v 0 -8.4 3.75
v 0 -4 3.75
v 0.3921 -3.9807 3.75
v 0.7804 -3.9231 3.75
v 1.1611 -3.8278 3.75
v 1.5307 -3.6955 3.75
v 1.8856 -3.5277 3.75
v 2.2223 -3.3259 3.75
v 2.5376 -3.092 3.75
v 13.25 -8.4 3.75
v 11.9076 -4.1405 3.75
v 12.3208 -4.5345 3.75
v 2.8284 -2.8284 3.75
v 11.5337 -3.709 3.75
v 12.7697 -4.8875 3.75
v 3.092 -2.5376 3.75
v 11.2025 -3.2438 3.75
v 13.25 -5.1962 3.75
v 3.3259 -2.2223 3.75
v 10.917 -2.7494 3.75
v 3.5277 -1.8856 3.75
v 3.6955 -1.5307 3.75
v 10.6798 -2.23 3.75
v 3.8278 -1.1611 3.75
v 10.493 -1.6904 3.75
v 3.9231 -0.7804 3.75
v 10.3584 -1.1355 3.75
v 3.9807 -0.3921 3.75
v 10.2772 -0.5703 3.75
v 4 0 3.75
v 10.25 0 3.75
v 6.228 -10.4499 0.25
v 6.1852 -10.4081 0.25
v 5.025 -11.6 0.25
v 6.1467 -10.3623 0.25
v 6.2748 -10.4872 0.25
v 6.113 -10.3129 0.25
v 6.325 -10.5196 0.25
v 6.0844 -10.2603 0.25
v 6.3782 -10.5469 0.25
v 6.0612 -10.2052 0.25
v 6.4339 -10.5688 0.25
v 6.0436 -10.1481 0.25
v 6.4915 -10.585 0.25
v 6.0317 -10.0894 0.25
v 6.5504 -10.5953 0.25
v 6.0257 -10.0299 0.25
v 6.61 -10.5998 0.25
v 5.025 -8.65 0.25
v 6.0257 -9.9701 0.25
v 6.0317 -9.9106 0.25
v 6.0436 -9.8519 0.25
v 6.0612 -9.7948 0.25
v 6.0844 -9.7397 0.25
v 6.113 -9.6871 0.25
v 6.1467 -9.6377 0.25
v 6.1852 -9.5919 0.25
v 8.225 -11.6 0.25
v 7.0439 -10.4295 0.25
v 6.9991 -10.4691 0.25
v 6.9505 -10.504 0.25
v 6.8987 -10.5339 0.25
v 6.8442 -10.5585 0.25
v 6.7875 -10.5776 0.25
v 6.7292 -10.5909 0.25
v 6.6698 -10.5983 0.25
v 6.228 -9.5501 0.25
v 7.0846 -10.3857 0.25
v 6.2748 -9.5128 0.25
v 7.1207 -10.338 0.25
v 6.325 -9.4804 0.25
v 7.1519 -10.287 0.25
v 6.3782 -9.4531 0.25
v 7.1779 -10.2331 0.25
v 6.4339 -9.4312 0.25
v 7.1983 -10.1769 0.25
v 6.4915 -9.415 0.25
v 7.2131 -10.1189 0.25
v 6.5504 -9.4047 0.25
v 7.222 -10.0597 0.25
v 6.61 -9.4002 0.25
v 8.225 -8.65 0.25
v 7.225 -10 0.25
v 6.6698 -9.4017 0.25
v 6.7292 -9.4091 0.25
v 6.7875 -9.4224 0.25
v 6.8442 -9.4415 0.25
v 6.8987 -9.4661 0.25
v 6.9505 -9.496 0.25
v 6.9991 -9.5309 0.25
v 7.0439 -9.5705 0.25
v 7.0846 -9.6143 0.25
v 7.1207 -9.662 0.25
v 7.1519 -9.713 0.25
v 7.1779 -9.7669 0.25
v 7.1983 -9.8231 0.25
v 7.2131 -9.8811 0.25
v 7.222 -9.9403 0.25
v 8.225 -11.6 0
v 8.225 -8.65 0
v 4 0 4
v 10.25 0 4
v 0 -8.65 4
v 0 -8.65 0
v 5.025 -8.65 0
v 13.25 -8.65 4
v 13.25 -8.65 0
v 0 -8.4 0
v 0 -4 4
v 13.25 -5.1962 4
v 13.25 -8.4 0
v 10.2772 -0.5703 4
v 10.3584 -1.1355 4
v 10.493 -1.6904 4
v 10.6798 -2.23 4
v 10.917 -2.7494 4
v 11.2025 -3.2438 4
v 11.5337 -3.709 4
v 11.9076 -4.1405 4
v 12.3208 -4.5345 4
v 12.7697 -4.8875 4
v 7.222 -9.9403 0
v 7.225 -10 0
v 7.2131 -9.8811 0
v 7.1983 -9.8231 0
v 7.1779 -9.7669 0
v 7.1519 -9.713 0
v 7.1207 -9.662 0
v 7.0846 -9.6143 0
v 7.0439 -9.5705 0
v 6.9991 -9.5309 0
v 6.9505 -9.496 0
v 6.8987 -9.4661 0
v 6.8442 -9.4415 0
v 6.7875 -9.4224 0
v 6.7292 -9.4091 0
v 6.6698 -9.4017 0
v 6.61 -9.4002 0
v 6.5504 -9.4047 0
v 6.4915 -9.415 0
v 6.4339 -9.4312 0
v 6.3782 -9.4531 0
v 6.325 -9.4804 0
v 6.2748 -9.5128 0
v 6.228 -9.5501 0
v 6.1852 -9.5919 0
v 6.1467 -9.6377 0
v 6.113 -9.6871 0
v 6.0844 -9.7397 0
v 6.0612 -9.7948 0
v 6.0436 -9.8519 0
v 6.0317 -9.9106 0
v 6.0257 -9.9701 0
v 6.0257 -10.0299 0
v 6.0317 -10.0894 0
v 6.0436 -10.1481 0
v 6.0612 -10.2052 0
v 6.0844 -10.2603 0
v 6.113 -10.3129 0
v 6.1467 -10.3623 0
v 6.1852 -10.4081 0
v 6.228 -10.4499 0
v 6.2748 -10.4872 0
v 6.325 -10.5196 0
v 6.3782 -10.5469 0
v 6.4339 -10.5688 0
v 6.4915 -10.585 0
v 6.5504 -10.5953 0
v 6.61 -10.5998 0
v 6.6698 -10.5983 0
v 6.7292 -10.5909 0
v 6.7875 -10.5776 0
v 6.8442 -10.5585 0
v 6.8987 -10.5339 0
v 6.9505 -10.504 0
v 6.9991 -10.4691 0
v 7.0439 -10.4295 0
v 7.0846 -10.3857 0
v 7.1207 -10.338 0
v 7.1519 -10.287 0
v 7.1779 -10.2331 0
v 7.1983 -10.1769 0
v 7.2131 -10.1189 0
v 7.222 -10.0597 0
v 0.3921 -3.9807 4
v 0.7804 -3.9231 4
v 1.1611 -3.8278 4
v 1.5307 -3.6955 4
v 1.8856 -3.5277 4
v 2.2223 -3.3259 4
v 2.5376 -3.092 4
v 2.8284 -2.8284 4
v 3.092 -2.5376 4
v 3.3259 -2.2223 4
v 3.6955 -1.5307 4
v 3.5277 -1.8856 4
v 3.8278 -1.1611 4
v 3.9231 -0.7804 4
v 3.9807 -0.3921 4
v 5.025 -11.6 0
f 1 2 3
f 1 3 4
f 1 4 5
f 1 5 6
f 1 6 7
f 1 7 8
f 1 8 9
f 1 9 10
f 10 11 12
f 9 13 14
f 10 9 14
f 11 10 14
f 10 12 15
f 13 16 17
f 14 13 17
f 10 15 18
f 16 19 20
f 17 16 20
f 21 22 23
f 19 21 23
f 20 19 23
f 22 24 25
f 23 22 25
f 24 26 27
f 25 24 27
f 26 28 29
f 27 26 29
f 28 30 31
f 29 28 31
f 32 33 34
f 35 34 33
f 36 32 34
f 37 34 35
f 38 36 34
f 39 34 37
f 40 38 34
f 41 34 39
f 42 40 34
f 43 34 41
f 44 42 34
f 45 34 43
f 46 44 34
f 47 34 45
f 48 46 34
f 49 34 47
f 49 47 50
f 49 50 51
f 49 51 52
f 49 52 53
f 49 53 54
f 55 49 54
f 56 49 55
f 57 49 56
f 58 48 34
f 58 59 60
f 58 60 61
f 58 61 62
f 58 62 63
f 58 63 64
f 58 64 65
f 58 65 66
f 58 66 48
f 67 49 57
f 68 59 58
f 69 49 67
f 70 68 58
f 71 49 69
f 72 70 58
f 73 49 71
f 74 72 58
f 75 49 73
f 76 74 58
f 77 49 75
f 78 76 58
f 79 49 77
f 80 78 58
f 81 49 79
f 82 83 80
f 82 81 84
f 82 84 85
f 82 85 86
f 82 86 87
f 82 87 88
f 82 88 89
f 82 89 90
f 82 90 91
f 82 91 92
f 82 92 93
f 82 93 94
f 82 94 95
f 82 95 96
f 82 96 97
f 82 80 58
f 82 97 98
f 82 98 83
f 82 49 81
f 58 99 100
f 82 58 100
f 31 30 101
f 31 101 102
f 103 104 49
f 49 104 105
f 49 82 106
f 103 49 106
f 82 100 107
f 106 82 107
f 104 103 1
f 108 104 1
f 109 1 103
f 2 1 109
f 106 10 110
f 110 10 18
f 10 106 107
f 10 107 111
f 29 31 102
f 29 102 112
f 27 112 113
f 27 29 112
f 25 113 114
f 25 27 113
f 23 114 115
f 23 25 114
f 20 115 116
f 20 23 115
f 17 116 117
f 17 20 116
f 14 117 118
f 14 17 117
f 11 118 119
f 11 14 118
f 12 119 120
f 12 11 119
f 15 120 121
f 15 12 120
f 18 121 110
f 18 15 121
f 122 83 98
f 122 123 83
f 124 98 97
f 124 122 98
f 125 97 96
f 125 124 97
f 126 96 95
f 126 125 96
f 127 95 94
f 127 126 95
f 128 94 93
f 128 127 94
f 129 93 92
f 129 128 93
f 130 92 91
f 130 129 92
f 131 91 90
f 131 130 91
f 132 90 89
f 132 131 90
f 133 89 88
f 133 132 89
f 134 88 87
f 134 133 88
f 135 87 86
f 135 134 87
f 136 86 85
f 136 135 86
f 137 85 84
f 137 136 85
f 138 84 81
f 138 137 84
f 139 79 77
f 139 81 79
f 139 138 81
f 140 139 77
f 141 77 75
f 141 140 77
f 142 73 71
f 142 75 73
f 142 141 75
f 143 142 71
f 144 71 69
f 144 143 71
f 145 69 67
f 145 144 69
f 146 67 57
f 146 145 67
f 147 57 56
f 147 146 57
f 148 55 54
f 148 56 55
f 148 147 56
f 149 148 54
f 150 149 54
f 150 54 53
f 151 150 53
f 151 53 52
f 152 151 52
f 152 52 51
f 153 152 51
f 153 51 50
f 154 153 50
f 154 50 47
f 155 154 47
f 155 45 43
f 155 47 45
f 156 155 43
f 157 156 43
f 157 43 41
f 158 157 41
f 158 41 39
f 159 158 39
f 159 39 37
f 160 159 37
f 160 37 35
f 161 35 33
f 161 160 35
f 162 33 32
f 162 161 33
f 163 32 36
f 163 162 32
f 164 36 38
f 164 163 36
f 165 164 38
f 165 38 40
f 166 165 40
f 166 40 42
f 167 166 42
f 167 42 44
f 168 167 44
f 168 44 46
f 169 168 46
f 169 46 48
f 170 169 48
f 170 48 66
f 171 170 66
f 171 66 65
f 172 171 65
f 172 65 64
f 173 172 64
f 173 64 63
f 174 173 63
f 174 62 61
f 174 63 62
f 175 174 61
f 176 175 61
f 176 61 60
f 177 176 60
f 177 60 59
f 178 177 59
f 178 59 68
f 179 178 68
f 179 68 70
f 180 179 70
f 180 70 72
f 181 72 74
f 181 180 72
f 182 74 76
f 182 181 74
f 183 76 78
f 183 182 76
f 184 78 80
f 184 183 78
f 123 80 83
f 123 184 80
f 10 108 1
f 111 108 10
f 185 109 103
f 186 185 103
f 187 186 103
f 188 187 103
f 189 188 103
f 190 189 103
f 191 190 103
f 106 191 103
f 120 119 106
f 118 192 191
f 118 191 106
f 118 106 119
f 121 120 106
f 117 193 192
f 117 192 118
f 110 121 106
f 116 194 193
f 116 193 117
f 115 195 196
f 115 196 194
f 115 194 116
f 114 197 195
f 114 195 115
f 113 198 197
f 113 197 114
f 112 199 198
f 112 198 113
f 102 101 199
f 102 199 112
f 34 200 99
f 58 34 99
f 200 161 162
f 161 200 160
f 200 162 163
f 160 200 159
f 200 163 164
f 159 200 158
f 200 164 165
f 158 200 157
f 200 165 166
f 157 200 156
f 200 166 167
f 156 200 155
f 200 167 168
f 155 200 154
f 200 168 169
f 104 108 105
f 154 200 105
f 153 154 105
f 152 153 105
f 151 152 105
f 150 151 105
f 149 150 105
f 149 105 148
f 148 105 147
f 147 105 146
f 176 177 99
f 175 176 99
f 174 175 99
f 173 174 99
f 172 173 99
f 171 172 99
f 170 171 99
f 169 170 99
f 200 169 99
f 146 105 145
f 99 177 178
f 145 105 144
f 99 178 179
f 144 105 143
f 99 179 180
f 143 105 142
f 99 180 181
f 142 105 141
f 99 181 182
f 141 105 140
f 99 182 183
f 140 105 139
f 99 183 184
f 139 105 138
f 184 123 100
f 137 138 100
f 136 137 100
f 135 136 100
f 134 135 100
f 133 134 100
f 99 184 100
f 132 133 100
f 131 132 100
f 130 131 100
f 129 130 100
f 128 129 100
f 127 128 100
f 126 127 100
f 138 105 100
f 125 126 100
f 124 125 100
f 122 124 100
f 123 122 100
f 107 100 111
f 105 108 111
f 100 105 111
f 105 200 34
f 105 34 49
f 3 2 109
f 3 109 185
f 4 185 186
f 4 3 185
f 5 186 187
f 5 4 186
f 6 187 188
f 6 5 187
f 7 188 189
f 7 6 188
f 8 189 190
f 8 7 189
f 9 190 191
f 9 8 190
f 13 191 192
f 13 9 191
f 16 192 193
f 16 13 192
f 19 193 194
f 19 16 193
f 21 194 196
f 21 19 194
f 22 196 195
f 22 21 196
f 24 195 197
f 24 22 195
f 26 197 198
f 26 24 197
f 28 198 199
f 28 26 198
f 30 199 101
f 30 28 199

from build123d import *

# Parameters (mm, degrees)
CYLINDER002_R     = 0.6
CYLINDER002_DEPTH = 4
CYLINDER001_R     = 6
CYLINDER001_DEPTH = 6
CYLINDER_R        = 4
CYLINDER_DEPTH    = 6
CUBE004_W         = 6.025
CUBE004_H         = 3.95
CUBE004_DEPTH     = 4
CUBE003_W         = 6.025
CUBE003_H         = 3.95
CUBE003_DEPTH     = 4
CUBE002_W         = 15.25
CUBE002_H         = 11.6
CUBE002_DEPTH     = 4
CUBE001_W         = 15.25
CUBE001_H         = 3.95
CUBE001_DEPTH     = 4
CUBE_W            = 13.25
CUBE_H            = 11.6
CUBE_DEPTH        = 4


with BuildPart() as cylinder002:
    # cylinder002 → cylinder002 (new body)
    with BuildSketch(Plane(origin=(6.625, -10, -1), x_dir=(1, 0, 0), z_dir=(0, 0, 1))):
        Circle(CYLINDER002_R)
    extrude(amount=CYLINDER002_DEPTH)


with BuildPart() as cylinder001:
    # cylinder001 → cylinder001 (new body)
    with BuildSketch(Plane(origin=(16.25, 0, 0), x_dir=(1, 0, 0), z_dir=(0, 0, 1))):
        Circle(CYLINDER001_R)
    extrude(amount=CYLINDER001_DEPTH)


with BuildPart() as cylinder:
    # cylinder → cylinder (new body)
    with BuildSketch(Plane.XY):
        Circle(CYLINDER_R)
    extrude(amount=CYLINDER_DEPTH)


with BuildPart() as cube004:
    # cube004 → cube004 (new body)
    with BuildSketch(Plane(origin=(8.225, -12.6, -1), x_dir=(1, 0, 0), z_dir=(0, 0, 1))):
        with Locations((3.0125, 1.975)):
            Rectangle(CUBE004_W, CUBE004_H)
    extrude(amount=CUBE004_DEPTH)


with BuildPart() as cube003:
    # cube003 → cube003 (new body)
    with BuildSketch(Plane(origin=(-1, -12.6, -1), x_dir=(1, 0, 0), z_dir=(0, 0, 1))):
        with Locations((3.0125, 1.975)):
            Rectangle(CUBE003_W, CUBE003_H)
    extrude(amount=CUBE003_DEPTH)


with BuildPart() as cube002:
    # cube002 → cube002 (new body)
    with BuildSketch(Plane(origin=(-1, -8.4, -0.25), x_dir=(1, 0, 0), z_dir=(0, 0, 1))):
        with Locations((7.625, 5.8)):
            Rectangle(CUBE002_W, CUBE002_H)
    extrude(amount=CUBE002_DEPTH)


with BuildPart() as cube001:
    # cube001 → cube001 (new body)
    with BuildSketch(Plane(origin=(-1, -1, 0.25), x_dir=(1, 0, 0), z_dir=(0, 0, 1))):
        with Locations((7.625, 1.975)):
            Rectangle(CUBE001_W, CUBE001_H)
    extrude(amount=CUBE001_DEPTH)


with BuildPart() as difference006:
    # cube → cube (new body)
    with BuildSketch(Plane.XY):
        with Locations((6.625, 5.8)):
            Rectangle(CUBE_W, CUBE_H)
    extrude(amount=CUBE_DEPTH)

    # difference: cut cube001
    add(cube001.part, mode=Mode.SUBTRACT)


with BuildPart() as difference006_1:
    # difference placement: moved
    add(difference006.part.moved(Location((0, -11.6, 0))))

    # difference001: cut cube002
    add(cube002.part, mode=Mode.SUBTRACT)

    # difference002: cut cube003
    add(cube003.part, mode=Mode.SUBTRACT)

    # difference003: cut cube004
    add(cube004.part, mode=Mode.SUBTRACT)

    # difference004: cut cylinder
    add(cylinder.part, mode=Mode.SUBTRACT)

    # difference005: cut cylinder001
    add(cylinder001.part, mode=Mode.SUBTRACT)

    # difference006: cut cylinder002
    add(cylinder002.part, mode=Mode.SUBTRACT)


solid = difference006_1.part
